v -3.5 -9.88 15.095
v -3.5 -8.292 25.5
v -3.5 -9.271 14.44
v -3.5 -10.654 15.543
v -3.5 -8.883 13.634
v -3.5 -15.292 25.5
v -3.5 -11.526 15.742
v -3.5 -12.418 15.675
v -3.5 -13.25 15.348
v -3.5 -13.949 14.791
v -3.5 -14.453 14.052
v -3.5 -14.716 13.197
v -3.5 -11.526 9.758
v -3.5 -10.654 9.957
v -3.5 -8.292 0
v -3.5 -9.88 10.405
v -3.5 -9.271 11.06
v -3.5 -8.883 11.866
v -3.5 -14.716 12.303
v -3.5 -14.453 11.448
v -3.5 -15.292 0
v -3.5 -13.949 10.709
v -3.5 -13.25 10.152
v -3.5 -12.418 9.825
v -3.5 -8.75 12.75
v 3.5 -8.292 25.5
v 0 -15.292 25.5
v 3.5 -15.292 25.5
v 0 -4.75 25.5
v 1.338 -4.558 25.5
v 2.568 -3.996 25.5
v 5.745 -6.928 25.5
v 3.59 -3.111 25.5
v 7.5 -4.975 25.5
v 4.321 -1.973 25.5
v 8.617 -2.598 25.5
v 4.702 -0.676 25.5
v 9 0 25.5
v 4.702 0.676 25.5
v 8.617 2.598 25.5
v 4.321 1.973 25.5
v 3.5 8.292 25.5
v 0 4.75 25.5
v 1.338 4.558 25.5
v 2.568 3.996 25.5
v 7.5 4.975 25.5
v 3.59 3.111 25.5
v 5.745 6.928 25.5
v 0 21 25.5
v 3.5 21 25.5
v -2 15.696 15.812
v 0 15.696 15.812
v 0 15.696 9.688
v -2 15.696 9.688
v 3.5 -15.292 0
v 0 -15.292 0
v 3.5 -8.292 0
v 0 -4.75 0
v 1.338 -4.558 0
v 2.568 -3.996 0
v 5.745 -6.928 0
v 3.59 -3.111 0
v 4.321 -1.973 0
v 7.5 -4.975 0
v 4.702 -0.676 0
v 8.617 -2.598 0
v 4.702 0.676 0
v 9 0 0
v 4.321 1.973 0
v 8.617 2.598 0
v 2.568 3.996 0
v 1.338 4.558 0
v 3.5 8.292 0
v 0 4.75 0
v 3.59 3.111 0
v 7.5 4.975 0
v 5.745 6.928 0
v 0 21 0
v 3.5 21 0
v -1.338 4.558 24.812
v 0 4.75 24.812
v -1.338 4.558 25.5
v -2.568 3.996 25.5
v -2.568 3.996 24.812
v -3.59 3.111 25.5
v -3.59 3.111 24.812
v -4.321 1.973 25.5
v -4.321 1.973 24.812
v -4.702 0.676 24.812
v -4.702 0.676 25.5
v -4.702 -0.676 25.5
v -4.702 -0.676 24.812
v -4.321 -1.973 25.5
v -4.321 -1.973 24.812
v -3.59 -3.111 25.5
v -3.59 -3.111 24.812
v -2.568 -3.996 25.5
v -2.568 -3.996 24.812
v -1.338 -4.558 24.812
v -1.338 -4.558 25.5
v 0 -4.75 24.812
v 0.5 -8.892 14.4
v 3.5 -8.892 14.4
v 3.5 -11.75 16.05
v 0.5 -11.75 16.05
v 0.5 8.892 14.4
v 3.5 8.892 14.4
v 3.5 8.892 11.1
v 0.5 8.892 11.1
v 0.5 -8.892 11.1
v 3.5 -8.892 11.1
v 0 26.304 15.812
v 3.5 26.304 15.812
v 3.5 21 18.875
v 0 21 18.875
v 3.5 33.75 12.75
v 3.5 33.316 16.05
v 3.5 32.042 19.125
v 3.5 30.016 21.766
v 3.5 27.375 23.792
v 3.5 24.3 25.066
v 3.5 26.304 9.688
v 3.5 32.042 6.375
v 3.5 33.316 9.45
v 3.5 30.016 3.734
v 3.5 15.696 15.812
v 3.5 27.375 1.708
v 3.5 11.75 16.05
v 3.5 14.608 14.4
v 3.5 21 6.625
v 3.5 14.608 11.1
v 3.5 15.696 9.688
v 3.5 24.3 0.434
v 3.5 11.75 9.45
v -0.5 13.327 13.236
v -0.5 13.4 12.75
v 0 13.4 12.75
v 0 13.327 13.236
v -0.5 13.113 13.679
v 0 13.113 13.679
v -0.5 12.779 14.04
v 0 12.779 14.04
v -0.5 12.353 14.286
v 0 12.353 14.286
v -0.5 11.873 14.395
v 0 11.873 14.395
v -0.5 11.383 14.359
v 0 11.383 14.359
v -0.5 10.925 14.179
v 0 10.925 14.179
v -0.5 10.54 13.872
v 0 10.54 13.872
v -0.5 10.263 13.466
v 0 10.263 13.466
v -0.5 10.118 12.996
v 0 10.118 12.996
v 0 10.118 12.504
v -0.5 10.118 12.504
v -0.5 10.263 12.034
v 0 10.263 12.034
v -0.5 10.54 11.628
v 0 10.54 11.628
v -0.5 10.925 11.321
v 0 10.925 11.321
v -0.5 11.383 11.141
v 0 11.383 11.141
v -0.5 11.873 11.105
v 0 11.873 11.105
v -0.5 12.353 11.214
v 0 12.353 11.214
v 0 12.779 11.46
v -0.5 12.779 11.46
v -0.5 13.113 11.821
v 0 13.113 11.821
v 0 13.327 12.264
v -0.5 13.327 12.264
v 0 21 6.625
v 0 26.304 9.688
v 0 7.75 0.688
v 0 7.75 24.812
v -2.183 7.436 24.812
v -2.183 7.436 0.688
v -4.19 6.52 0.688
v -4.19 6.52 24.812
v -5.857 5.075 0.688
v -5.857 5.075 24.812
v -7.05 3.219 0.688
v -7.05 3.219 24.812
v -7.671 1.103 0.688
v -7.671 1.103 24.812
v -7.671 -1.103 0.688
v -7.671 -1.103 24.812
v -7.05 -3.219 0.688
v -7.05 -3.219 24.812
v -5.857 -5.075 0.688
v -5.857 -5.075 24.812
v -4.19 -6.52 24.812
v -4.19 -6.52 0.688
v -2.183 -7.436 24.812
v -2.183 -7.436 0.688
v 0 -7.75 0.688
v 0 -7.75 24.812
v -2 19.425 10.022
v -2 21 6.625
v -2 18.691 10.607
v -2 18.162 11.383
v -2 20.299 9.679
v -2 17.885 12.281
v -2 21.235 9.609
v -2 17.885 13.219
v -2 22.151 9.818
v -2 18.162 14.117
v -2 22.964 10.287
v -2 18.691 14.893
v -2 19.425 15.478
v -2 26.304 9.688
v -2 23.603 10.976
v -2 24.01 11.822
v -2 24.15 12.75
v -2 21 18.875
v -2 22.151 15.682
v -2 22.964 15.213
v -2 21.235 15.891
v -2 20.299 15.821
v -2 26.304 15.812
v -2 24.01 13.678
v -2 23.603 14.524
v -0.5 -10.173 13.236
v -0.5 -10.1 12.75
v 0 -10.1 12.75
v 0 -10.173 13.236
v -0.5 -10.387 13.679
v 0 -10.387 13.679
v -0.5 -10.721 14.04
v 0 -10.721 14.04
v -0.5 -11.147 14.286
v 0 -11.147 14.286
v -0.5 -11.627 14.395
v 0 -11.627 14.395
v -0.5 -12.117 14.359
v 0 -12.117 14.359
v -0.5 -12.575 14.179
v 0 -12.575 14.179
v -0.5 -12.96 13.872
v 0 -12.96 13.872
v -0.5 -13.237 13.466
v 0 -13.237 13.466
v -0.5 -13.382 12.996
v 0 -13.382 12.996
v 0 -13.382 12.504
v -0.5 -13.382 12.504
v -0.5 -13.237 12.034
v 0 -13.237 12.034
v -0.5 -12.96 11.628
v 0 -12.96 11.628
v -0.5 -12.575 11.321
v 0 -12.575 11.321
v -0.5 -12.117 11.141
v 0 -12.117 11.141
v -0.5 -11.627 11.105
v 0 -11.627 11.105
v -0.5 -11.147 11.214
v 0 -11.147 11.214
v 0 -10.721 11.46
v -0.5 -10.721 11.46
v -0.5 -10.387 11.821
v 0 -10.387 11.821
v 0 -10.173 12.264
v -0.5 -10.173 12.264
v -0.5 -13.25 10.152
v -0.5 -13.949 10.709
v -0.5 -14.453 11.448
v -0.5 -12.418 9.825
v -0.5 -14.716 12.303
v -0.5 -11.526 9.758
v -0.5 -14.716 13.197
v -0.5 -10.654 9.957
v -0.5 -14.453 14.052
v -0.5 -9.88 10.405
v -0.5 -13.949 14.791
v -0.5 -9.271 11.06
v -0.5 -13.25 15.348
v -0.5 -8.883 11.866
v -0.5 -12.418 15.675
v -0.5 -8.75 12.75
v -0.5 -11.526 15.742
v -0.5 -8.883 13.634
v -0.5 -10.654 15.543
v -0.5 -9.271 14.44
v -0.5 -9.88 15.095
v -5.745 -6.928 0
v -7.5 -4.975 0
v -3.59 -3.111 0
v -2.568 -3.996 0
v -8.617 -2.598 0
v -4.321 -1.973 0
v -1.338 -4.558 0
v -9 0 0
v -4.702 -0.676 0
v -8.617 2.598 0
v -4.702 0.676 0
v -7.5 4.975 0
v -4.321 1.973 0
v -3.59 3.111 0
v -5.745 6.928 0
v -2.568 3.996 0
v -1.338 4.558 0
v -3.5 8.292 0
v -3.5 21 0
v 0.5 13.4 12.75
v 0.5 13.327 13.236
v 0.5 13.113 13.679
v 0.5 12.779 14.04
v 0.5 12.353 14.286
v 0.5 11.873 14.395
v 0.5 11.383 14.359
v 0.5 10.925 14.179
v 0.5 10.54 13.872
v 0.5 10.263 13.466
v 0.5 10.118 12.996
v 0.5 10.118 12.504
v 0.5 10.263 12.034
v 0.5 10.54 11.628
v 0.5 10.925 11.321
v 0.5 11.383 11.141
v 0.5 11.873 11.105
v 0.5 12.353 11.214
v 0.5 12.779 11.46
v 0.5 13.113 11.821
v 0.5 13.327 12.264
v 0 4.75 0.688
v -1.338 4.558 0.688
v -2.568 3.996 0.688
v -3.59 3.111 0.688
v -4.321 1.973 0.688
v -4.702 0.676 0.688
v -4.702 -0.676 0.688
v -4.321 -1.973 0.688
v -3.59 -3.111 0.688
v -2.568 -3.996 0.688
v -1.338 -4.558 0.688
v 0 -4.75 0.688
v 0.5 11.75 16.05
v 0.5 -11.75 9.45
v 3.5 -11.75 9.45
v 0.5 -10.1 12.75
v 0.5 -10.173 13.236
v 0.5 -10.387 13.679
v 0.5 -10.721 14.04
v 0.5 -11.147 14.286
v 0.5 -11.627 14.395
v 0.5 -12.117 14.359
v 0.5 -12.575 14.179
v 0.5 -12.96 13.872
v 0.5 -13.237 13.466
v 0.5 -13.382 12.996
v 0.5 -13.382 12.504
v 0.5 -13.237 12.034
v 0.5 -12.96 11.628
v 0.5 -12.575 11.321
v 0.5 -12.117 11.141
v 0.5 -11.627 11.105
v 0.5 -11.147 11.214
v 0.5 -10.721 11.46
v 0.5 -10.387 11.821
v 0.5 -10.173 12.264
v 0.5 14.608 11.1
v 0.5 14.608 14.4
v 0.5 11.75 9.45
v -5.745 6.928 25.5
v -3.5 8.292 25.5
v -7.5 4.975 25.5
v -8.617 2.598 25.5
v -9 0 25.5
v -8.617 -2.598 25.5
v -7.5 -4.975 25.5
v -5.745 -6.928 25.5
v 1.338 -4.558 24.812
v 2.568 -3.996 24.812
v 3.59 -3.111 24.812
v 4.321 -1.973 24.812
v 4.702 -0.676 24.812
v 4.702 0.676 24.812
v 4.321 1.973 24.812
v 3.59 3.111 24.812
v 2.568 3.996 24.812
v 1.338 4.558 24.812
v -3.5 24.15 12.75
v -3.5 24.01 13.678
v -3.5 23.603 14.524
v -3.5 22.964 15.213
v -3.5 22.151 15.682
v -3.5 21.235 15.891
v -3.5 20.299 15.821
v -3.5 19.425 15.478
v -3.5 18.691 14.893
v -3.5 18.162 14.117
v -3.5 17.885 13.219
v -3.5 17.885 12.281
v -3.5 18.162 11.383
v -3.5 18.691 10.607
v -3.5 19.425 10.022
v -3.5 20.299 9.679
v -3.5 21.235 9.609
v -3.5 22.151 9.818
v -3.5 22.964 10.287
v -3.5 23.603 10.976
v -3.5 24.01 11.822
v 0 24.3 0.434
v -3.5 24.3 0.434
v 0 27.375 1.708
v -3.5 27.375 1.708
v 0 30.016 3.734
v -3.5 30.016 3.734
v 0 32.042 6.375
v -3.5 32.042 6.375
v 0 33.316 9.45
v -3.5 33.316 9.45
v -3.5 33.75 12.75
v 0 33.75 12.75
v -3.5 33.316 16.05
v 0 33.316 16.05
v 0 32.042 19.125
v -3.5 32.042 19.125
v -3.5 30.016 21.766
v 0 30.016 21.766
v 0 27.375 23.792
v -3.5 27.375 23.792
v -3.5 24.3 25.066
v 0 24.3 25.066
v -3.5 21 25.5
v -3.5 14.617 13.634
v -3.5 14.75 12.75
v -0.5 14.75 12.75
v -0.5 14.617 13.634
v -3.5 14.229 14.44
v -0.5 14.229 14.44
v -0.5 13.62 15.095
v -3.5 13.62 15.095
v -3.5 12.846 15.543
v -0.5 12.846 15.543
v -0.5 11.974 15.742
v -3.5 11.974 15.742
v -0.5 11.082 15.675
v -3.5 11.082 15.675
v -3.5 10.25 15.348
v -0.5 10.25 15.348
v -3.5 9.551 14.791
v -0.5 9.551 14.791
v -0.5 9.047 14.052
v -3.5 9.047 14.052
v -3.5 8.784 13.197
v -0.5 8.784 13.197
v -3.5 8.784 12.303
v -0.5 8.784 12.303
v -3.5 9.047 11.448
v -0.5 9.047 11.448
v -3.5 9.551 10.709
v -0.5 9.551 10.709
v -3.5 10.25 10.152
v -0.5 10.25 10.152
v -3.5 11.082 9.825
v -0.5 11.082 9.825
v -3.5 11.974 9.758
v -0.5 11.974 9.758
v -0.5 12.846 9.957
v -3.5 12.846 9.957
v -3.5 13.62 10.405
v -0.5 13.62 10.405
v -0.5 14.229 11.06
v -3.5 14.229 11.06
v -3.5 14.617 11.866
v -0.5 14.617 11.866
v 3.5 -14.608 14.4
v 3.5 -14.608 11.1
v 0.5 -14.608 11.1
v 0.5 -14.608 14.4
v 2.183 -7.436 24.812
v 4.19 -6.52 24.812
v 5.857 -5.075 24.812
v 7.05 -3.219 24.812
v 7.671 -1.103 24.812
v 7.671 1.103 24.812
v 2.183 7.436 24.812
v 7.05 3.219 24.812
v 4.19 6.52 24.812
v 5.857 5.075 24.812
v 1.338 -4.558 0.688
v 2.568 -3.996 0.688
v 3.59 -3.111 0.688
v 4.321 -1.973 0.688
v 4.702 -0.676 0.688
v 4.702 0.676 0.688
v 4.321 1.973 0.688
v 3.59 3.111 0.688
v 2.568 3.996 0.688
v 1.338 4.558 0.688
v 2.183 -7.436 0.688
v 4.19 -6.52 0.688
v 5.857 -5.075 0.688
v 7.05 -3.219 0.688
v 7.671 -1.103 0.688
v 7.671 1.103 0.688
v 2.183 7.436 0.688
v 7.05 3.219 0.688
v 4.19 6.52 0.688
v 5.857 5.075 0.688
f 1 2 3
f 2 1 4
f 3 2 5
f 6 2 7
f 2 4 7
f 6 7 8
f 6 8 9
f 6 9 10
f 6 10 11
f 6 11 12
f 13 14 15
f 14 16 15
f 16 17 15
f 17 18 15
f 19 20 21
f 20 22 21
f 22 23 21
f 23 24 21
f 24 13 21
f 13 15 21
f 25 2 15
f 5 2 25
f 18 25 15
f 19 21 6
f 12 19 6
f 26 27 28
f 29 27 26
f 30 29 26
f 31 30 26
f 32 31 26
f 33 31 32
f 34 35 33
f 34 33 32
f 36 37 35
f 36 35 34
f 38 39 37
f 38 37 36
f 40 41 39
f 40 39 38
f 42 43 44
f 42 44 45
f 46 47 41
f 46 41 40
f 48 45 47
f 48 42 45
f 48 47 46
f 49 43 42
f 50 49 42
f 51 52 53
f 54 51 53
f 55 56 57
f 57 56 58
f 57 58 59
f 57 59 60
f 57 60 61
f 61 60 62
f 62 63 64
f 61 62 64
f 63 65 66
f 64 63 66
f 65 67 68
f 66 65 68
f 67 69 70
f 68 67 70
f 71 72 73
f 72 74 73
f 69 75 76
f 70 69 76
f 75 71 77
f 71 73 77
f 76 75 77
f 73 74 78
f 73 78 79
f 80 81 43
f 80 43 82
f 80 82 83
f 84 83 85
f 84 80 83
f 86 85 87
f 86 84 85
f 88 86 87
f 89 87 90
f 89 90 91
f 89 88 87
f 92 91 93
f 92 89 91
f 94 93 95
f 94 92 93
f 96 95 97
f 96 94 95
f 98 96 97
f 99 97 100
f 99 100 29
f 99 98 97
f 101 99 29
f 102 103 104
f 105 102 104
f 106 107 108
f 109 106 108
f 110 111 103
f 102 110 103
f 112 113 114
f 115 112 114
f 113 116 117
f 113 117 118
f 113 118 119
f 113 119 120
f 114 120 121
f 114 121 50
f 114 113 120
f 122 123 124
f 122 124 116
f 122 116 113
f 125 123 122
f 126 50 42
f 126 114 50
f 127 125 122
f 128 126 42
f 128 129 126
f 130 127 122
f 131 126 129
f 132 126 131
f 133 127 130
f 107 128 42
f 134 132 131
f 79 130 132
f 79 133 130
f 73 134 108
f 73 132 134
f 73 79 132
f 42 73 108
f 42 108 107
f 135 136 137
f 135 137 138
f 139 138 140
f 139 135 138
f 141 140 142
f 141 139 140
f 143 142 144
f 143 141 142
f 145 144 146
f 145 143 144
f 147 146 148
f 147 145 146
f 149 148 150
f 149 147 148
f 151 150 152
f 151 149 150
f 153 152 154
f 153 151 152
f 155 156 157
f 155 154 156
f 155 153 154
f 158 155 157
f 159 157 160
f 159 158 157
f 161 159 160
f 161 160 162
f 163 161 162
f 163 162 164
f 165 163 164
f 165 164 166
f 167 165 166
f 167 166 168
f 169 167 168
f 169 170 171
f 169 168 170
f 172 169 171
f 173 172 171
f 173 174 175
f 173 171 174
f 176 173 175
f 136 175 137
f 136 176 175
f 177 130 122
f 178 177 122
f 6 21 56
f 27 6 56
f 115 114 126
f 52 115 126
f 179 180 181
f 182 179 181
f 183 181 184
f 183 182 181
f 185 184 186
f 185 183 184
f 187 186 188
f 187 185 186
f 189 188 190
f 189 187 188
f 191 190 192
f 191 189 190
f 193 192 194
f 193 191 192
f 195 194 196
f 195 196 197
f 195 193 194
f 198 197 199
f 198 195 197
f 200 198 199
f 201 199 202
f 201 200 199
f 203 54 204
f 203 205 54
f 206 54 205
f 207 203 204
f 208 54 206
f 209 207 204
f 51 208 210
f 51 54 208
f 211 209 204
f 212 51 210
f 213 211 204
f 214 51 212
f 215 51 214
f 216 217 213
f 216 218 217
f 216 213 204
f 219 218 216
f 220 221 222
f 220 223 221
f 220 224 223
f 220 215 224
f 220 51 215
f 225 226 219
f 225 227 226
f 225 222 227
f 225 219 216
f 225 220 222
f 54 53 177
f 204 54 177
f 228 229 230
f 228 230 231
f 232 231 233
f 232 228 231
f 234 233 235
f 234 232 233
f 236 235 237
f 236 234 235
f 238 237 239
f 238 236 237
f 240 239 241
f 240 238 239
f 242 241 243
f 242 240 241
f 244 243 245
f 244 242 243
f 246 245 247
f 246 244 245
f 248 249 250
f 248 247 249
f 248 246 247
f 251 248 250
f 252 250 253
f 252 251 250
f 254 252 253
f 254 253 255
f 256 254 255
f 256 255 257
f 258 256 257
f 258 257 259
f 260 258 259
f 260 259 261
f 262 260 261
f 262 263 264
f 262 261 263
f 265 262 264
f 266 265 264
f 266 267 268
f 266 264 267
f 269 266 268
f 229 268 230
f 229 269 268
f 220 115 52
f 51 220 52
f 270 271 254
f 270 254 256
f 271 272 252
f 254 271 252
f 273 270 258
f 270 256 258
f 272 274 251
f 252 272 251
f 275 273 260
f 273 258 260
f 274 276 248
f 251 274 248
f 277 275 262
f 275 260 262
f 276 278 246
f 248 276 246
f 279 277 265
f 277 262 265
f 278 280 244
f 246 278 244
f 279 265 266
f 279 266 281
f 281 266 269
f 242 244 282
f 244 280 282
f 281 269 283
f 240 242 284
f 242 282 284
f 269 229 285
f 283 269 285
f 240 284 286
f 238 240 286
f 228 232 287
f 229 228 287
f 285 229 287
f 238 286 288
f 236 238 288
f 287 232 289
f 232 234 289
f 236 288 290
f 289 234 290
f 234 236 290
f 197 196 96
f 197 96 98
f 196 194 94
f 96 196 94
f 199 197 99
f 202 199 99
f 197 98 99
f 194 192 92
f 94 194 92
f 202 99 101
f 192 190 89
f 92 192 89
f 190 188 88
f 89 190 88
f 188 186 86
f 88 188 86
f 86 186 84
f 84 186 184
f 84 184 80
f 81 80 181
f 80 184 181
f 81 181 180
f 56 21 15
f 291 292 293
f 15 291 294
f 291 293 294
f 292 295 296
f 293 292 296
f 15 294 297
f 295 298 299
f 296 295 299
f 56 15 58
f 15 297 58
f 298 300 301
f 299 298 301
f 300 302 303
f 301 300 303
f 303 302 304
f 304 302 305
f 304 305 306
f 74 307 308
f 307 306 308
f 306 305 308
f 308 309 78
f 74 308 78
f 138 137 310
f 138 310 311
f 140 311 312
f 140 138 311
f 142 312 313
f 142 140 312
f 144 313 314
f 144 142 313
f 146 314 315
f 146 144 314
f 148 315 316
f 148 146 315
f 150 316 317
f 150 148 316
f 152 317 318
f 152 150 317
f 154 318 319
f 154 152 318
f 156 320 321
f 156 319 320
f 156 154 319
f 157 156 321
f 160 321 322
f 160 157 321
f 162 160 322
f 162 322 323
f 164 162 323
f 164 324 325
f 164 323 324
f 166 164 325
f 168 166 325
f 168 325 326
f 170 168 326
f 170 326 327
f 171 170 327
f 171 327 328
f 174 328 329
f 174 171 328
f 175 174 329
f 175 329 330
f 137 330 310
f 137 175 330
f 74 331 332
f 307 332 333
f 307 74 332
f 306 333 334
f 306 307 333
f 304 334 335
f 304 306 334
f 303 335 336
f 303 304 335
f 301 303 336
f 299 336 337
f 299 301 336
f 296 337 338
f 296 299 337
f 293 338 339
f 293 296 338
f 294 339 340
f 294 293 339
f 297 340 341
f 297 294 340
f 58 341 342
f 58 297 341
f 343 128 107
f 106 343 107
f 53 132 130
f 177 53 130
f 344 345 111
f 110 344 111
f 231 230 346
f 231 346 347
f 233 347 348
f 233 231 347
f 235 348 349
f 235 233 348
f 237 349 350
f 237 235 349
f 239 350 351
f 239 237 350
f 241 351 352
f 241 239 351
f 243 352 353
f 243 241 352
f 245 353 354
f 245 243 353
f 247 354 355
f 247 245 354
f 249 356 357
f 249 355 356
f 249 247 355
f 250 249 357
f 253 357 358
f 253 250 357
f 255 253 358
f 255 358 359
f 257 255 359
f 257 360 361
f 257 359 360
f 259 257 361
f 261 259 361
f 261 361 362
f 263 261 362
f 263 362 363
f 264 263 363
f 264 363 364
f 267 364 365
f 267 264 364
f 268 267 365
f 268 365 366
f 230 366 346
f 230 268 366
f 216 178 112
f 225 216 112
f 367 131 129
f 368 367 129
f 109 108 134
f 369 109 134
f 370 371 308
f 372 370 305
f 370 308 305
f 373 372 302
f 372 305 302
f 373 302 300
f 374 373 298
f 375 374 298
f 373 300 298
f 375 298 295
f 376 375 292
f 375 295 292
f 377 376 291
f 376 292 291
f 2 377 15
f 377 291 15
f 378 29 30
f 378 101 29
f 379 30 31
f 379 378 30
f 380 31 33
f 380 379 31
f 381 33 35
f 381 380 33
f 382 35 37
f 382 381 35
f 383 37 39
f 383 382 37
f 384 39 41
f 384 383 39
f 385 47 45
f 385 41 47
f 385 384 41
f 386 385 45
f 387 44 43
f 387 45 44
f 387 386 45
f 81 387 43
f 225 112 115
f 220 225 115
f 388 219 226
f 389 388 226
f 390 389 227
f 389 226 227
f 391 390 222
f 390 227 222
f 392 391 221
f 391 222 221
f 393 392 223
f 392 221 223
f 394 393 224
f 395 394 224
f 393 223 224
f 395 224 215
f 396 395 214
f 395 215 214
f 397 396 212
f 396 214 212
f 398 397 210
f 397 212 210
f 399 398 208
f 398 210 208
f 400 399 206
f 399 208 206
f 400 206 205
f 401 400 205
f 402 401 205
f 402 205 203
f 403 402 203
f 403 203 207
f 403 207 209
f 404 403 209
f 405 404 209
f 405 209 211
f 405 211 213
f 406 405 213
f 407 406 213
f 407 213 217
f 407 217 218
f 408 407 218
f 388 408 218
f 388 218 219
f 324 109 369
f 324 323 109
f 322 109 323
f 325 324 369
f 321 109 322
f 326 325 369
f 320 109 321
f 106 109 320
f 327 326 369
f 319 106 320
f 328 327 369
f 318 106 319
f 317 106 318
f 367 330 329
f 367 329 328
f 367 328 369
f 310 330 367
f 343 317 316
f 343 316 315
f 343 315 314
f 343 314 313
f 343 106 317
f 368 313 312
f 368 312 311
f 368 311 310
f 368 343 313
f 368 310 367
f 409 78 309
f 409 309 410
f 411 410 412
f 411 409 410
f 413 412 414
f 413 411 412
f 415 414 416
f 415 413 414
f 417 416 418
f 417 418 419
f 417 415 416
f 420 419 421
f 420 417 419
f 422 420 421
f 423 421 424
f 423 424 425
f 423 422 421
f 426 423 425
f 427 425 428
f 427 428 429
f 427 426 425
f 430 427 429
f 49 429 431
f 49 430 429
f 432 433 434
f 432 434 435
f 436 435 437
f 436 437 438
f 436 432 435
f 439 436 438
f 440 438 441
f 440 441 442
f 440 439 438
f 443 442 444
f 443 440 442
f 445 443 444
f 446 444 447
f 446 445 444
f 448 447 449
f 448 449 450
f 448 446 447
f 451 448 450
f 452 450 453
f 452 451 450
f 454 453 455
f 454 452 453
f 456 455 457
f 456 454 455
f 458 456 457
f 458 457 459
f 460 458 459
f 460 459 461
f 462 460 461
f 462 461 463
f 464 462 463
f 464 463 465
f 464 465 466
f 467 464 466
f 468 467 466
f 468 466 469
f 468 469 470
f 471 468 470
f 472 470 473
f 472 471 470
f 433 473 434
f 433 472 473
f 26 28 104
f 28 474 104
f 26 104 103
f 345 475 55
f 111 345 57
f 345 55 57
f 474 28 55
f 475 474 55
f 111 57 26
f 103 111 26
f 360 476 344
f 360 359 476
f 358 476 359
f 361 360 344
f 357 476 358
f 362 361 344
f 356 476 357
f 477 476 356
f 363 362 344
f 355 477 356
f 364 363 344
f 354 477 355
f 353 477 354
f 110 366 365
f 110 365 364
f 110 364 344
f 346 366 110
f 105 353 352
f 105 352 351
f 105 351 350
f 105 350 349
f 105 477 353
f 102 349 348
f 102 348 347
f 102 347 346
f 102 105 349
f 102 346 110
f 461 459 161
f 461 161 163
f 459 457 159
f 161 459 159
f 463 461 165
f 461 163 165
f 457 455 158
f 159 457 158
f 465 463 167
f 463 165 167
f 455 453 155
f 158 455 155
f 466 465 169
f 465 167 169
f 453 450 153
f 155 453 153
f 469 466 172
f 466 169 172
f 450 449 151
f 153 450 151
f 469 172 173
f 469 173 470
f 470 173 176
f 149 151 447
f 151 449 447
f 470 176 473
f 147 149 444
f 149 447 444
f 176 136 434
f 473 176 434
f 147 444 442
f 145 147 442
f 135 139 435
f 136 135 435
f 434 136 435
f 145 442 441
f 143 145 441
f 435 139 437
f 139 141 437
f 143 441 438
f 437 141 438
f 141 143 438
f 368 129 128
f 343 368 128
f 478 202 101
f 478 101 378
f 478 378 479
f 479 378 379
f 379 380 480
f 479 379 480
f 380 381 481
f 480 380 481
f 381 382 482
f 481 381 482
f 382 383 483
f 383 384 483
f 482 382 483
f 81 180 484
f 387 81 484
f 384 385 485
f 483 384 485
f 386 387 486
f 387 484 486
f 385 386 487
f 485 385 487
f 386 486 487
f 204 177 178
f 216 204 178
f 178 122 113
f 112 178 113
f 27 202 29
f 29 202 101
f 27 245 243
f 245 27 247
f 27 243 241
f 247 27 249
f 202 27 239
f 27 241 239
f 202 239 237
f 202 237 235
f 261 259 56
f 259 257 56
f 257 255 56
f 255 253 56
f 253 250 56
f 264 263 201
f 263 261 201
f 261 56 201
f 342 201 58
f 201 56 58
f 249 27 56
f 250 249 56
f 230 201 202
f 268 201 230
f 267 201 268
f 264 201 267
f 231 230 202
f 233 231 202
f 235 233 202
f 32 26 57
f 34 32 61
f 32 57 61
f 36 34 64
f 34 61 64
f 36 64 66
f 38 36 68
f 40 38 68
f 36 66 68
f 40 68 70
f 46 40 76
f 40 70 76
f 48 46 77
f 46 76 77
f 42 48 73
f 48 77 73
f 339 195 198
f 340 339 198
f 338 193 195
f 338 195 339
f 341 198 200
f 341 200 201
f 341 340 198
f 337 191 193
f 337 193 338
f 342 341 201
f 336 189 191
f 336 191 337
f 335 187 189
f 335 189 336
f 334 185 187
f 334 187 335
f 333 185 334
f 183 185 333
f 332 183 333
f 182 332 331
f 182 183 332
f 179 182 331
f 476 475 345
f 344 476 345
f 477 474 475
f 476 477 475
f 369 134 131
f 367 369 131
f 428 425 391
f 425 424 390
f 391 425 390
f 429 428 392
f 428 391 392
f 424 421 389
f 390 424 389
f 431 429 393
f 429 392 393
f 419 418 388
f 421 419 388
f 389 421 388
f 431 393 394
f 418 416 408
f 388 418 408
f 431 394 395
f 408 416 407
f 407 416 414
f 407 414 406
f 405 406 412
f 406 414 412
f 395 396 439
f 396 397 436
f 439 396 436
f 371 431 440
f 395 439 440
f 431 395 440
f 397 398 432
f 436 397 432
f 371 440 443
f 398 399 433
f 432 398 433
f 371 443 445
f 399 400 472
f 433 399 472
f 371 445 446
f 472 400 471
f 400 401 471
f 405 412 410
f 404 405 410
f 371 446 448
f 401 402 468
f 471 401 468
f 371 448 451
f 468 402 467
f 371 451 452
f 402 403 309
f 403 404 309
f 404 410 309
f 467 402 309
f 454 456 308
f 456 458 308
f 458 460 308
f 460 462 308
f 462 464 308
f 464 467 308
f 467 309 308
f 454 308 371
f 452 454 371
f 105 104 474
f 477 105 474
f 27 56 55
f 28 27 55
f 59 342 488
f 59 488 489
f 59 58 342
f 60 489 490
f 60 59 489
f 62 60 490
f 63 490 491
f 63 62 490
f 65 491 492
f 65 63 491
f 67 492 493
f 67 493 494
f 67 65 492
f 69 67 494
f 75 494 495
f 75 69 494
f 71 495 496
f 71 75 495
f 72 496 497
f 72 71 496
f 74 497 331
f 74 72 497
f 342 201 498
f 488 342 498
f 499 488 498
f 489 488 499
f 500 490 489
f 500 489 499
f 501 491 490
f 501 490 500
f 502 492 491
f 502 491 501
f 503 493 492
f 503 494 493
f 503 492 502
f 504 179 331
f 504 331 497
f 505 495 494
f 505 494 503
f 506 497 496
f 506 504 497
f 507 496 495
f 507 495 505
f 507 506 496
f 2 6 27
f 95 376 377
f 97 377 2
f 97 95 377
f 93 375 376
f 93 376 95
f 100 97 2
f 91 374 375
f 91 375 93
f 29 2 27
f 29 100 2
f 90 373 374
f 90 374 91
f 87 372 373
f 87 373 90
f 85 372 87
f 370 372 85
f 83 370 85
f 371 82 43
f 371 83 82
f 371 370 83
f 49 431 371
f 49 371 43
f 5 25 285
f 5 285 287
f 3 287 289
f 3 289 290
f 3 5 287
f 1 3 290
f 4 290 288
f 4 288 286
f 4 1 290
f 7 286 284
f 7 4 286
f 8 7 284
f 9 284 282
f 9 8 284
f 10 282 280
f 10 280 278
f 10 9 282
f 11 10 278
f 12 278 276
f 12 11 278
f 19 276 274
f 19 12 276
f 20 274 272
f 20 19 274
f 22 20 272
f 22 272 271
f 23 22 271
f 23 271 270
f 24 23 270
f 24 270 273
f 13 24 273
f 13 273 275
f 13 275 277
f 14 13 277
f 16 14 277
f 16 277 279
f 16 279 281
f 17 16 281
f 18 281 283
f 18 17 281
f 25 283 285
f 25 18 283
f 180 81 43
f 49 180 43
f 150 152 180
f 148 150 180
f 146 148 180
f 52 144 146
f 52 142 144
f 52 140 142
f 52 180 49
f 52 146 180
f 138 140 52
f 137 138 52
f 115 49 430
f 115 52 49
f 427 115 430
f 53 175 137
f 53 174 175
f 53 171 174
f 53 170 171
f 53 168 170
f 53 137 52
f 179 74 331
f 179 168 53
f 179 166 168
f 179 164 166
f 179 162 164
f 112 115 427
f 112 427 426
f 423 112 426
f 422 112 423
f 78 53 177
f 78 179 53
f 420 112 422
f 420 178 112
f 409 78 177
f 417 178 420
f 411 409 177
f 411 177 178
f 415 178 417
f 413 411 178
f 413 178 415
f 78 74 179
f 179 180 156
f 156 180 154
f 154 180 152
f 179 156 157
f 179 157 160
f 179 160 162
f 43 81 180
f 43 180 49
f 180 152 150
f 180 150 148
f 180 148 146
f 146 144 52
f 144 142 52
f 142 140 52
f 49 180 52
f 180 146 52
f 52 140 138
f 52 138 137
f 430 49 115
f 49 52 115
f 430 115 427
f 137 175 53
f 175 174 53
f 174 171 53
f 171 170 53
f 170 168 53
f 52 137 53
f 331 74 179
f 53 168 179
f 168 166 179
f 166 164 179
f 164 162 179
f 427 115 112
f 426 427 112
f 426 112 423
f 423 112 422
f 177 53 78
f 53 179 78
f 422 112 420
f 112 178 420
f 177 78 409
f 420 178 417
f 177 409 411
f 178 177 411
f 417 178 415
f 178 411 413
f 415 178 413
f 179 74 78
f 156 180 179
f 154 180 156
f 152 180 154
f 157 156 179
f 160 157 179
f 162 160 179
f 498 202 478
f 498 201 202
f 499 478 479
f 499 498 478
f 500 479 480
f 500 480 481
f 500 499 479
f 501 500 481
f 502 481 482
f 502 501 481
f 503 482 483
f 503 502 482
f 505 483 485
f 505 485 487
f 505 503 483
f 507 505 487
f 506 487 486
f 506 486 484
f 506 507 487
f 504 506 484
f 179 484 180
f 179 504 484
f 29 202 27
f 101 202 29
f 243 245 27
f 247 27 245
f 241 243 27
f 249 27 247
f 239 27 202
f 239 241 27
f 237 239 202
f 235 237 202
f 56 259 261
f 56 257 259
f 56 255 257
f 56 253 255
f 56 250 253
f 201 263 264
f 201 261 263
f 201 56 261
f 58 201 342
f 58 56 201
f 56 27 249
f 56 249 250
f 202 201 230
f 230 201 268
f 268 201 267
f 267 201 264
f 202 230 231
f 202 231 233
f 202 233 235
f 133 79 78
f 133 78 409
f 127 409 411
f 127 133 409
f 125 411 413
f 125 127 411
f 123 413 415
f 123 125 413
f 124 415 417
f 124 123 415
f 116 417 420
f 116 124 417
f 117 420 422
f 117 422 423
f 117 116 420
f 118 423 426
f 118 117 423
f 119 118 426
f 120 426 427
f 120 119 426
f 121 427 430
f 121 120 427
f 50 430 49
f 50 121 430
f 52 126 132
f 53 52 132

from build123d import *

# Parameters (mm, degrees)
SKETCH_R        = 4.75
PAD_DEPTH       = 25.5
SKETCH001_R     = 7.75
POCKET_DEPTH    = 24.125
POCKET001_DEPTH = 5.5
SKETCH003_R     = 3.15
POCKET002_DEPTH = 9.001
POCKET003_DEPTH = 3
SKETCH007_R     = 1.65
POCKET004_DEPTH = 39.001
SKETCH008_R     = 3
POCKET005_DEPTH = 3
POCKET006_DEPTH = 59.001
SKETCH010_W     = 13.332988
SKETCH010_H     = 67.314425
POCKET007_DEPTH = 25.501
SKETCH011_W     = 23.817345
SKETCH011_H     = 55.988949
POCKET008_DEPTH = 25.501


with BuildPart() as stepper_trolley:
    # Sketch → Pad (new body)
    with BuildSketch(Plane.XY):
        with BuildLine():
            ThreePointArc((-3.5, 8.291562), (-9, 0), (-3.5, -8.291562))
            Line((-3.5, -8.291562), (-3.5, -15.291562))
            Line((-3.5, -15.291562), (3.5, -15.291562))
            Line((3.5, -15.291562), (3.5, -8.291562))
            ThreePointArc((3.5, -8.291562), (9, 0), (3.5, 8.291562))
            Line((3.5, 35), (3.5, 8.291562))
            Line((-3.5, 35), (3.5, 35))
            Line((-3.5, 35), (-3.5, 8.291562))
        make_face()
        Circle(SKETCH_R, mode=Mode.SUBTRACT)
    extrude(amount=PAD_DEPTH)

    # Sketch001 → Pocket (cut)
    with BuildSketch(Plane.XY.offset(0.6875)):
        Circle(SKETCH001_R)
    extrude(amount=POCKET_DEPTH, mode=Mode.SUBTRACT)

    # Sketch002 (on Face3 of Pocket) → Pocket001 (cut)
    with BuildSketch(Plane.YZ.offset(3.5)):
        Polygon((21, 18.875), (15.695594, 15.8125), (15.695594, 9.6875), (21, 6.625), (26.304406, 9.6875), (26.304406, 15.8125), align=None)
    extrude(amount=-POCKET001_DEPTH, mode=Mode.SUBTRACT)

    # Sketch003 → Pocket002 (cut, through all)
    with BuildSketch(Plane.YZ):
        with Locations((21, 12.75)):
            Circle(SKETCH003_R)
    extrude(amount=-POCKET002_DEPTH, mode=Mode.SUBTRACT)

    # Sketch006 → Pocket003 (cut)
    with BuildSketch(Plane.YZ.offset(3.5)):
        Polygon((-8.892116, 11.1), (-8.892116, 14.4), (-11.75, 16.05), (-14.607884, 14.4), (-14.607884, 11.1), (-11.75, 9.45), align=None)
        Polygon((14.607884, 11.1), (14.607884, 14.4), (11.75, 16.05), (8.892116, 14.4), (8.892116, 11.1), (11.75, 9.45), align=None)
    extrude(amount=-POCKET003_DEPTH, mode=Mode.SUBTRACT)

    # Sketch007 → Pocket004 (cut, through all)
    with BuildSketch(Plane.YZ.offset(-30)):
        with Locations((-11.75, 12.75)):
            Circle(SKETCH007_R)
        with Locations((11.75, 12.75)):
            Circle(SKETCH007_R)
    extrude(amount=POCKET004_DEPTH, mode=Mode.SUBTRACT)

    # Sketch008 → Pocket005 (cut)
    with BuildSketch(Plane.YZ.offset(-3.5)):
        with Locations((-11.75, 12.75)):
            Circle(SKETCH008_R)
        with Locations((11.75, 12.75)):
            Circle(SKETCH008_R)
    extrude(amount=POCKET005_DEPTH, mode=Mode.SUBTRACT)

    # Sketch009 → Pocket006 (cut, through all)
    with BuildSketch(Plane.YZ.offset(50)):
        with BuildLine():
            ThreePointArc((21, 0), (33.75, 12.75), (21, 25.5))
            Line((21, 25.5), (41, 25.5))
            Line((41, 25.5), (41, 0))
            Line((21, 0), (41, 0))
        make_face()
    extrude(amount=-POCKET006_DEPTH, mode=Mode.SUBTRACT)


with BuildPart() as stepper_trolley_top:
    # Body001 base: copy of stepper-trolley
    add(stepper_trolley.part)

    # Sketch010 → Pocket007 (cut, through all)
    with BuildSketch(Plane.XY):
        with Locations((6.666494, 10.230849)):
            Rectangle(SKETCH010_W, SKETCH010_H)
    extrude(amount=POCKET007_DEPTH, mode=Mode.SUBTRACT)


with BuildPart() as stepper_trolley_bottom:
    # Body002 base: copy of stepper-trolley
    add(stepper_trolley.part)

    # Sketch011 → Pocket008 (cut, through all)
    with BuildSketch(Plane.XY):
        with Locations((-11.908672, 7.674474)):
            Rectangle(SKETCH011_W, SKETCH011_H)
    extrude(amount=POCKET008_DEPTH, mode=Mode.SUBTRACT)


solid = Compound([stepper_trolley_top.part, stepper_trolley_bottom.part])
